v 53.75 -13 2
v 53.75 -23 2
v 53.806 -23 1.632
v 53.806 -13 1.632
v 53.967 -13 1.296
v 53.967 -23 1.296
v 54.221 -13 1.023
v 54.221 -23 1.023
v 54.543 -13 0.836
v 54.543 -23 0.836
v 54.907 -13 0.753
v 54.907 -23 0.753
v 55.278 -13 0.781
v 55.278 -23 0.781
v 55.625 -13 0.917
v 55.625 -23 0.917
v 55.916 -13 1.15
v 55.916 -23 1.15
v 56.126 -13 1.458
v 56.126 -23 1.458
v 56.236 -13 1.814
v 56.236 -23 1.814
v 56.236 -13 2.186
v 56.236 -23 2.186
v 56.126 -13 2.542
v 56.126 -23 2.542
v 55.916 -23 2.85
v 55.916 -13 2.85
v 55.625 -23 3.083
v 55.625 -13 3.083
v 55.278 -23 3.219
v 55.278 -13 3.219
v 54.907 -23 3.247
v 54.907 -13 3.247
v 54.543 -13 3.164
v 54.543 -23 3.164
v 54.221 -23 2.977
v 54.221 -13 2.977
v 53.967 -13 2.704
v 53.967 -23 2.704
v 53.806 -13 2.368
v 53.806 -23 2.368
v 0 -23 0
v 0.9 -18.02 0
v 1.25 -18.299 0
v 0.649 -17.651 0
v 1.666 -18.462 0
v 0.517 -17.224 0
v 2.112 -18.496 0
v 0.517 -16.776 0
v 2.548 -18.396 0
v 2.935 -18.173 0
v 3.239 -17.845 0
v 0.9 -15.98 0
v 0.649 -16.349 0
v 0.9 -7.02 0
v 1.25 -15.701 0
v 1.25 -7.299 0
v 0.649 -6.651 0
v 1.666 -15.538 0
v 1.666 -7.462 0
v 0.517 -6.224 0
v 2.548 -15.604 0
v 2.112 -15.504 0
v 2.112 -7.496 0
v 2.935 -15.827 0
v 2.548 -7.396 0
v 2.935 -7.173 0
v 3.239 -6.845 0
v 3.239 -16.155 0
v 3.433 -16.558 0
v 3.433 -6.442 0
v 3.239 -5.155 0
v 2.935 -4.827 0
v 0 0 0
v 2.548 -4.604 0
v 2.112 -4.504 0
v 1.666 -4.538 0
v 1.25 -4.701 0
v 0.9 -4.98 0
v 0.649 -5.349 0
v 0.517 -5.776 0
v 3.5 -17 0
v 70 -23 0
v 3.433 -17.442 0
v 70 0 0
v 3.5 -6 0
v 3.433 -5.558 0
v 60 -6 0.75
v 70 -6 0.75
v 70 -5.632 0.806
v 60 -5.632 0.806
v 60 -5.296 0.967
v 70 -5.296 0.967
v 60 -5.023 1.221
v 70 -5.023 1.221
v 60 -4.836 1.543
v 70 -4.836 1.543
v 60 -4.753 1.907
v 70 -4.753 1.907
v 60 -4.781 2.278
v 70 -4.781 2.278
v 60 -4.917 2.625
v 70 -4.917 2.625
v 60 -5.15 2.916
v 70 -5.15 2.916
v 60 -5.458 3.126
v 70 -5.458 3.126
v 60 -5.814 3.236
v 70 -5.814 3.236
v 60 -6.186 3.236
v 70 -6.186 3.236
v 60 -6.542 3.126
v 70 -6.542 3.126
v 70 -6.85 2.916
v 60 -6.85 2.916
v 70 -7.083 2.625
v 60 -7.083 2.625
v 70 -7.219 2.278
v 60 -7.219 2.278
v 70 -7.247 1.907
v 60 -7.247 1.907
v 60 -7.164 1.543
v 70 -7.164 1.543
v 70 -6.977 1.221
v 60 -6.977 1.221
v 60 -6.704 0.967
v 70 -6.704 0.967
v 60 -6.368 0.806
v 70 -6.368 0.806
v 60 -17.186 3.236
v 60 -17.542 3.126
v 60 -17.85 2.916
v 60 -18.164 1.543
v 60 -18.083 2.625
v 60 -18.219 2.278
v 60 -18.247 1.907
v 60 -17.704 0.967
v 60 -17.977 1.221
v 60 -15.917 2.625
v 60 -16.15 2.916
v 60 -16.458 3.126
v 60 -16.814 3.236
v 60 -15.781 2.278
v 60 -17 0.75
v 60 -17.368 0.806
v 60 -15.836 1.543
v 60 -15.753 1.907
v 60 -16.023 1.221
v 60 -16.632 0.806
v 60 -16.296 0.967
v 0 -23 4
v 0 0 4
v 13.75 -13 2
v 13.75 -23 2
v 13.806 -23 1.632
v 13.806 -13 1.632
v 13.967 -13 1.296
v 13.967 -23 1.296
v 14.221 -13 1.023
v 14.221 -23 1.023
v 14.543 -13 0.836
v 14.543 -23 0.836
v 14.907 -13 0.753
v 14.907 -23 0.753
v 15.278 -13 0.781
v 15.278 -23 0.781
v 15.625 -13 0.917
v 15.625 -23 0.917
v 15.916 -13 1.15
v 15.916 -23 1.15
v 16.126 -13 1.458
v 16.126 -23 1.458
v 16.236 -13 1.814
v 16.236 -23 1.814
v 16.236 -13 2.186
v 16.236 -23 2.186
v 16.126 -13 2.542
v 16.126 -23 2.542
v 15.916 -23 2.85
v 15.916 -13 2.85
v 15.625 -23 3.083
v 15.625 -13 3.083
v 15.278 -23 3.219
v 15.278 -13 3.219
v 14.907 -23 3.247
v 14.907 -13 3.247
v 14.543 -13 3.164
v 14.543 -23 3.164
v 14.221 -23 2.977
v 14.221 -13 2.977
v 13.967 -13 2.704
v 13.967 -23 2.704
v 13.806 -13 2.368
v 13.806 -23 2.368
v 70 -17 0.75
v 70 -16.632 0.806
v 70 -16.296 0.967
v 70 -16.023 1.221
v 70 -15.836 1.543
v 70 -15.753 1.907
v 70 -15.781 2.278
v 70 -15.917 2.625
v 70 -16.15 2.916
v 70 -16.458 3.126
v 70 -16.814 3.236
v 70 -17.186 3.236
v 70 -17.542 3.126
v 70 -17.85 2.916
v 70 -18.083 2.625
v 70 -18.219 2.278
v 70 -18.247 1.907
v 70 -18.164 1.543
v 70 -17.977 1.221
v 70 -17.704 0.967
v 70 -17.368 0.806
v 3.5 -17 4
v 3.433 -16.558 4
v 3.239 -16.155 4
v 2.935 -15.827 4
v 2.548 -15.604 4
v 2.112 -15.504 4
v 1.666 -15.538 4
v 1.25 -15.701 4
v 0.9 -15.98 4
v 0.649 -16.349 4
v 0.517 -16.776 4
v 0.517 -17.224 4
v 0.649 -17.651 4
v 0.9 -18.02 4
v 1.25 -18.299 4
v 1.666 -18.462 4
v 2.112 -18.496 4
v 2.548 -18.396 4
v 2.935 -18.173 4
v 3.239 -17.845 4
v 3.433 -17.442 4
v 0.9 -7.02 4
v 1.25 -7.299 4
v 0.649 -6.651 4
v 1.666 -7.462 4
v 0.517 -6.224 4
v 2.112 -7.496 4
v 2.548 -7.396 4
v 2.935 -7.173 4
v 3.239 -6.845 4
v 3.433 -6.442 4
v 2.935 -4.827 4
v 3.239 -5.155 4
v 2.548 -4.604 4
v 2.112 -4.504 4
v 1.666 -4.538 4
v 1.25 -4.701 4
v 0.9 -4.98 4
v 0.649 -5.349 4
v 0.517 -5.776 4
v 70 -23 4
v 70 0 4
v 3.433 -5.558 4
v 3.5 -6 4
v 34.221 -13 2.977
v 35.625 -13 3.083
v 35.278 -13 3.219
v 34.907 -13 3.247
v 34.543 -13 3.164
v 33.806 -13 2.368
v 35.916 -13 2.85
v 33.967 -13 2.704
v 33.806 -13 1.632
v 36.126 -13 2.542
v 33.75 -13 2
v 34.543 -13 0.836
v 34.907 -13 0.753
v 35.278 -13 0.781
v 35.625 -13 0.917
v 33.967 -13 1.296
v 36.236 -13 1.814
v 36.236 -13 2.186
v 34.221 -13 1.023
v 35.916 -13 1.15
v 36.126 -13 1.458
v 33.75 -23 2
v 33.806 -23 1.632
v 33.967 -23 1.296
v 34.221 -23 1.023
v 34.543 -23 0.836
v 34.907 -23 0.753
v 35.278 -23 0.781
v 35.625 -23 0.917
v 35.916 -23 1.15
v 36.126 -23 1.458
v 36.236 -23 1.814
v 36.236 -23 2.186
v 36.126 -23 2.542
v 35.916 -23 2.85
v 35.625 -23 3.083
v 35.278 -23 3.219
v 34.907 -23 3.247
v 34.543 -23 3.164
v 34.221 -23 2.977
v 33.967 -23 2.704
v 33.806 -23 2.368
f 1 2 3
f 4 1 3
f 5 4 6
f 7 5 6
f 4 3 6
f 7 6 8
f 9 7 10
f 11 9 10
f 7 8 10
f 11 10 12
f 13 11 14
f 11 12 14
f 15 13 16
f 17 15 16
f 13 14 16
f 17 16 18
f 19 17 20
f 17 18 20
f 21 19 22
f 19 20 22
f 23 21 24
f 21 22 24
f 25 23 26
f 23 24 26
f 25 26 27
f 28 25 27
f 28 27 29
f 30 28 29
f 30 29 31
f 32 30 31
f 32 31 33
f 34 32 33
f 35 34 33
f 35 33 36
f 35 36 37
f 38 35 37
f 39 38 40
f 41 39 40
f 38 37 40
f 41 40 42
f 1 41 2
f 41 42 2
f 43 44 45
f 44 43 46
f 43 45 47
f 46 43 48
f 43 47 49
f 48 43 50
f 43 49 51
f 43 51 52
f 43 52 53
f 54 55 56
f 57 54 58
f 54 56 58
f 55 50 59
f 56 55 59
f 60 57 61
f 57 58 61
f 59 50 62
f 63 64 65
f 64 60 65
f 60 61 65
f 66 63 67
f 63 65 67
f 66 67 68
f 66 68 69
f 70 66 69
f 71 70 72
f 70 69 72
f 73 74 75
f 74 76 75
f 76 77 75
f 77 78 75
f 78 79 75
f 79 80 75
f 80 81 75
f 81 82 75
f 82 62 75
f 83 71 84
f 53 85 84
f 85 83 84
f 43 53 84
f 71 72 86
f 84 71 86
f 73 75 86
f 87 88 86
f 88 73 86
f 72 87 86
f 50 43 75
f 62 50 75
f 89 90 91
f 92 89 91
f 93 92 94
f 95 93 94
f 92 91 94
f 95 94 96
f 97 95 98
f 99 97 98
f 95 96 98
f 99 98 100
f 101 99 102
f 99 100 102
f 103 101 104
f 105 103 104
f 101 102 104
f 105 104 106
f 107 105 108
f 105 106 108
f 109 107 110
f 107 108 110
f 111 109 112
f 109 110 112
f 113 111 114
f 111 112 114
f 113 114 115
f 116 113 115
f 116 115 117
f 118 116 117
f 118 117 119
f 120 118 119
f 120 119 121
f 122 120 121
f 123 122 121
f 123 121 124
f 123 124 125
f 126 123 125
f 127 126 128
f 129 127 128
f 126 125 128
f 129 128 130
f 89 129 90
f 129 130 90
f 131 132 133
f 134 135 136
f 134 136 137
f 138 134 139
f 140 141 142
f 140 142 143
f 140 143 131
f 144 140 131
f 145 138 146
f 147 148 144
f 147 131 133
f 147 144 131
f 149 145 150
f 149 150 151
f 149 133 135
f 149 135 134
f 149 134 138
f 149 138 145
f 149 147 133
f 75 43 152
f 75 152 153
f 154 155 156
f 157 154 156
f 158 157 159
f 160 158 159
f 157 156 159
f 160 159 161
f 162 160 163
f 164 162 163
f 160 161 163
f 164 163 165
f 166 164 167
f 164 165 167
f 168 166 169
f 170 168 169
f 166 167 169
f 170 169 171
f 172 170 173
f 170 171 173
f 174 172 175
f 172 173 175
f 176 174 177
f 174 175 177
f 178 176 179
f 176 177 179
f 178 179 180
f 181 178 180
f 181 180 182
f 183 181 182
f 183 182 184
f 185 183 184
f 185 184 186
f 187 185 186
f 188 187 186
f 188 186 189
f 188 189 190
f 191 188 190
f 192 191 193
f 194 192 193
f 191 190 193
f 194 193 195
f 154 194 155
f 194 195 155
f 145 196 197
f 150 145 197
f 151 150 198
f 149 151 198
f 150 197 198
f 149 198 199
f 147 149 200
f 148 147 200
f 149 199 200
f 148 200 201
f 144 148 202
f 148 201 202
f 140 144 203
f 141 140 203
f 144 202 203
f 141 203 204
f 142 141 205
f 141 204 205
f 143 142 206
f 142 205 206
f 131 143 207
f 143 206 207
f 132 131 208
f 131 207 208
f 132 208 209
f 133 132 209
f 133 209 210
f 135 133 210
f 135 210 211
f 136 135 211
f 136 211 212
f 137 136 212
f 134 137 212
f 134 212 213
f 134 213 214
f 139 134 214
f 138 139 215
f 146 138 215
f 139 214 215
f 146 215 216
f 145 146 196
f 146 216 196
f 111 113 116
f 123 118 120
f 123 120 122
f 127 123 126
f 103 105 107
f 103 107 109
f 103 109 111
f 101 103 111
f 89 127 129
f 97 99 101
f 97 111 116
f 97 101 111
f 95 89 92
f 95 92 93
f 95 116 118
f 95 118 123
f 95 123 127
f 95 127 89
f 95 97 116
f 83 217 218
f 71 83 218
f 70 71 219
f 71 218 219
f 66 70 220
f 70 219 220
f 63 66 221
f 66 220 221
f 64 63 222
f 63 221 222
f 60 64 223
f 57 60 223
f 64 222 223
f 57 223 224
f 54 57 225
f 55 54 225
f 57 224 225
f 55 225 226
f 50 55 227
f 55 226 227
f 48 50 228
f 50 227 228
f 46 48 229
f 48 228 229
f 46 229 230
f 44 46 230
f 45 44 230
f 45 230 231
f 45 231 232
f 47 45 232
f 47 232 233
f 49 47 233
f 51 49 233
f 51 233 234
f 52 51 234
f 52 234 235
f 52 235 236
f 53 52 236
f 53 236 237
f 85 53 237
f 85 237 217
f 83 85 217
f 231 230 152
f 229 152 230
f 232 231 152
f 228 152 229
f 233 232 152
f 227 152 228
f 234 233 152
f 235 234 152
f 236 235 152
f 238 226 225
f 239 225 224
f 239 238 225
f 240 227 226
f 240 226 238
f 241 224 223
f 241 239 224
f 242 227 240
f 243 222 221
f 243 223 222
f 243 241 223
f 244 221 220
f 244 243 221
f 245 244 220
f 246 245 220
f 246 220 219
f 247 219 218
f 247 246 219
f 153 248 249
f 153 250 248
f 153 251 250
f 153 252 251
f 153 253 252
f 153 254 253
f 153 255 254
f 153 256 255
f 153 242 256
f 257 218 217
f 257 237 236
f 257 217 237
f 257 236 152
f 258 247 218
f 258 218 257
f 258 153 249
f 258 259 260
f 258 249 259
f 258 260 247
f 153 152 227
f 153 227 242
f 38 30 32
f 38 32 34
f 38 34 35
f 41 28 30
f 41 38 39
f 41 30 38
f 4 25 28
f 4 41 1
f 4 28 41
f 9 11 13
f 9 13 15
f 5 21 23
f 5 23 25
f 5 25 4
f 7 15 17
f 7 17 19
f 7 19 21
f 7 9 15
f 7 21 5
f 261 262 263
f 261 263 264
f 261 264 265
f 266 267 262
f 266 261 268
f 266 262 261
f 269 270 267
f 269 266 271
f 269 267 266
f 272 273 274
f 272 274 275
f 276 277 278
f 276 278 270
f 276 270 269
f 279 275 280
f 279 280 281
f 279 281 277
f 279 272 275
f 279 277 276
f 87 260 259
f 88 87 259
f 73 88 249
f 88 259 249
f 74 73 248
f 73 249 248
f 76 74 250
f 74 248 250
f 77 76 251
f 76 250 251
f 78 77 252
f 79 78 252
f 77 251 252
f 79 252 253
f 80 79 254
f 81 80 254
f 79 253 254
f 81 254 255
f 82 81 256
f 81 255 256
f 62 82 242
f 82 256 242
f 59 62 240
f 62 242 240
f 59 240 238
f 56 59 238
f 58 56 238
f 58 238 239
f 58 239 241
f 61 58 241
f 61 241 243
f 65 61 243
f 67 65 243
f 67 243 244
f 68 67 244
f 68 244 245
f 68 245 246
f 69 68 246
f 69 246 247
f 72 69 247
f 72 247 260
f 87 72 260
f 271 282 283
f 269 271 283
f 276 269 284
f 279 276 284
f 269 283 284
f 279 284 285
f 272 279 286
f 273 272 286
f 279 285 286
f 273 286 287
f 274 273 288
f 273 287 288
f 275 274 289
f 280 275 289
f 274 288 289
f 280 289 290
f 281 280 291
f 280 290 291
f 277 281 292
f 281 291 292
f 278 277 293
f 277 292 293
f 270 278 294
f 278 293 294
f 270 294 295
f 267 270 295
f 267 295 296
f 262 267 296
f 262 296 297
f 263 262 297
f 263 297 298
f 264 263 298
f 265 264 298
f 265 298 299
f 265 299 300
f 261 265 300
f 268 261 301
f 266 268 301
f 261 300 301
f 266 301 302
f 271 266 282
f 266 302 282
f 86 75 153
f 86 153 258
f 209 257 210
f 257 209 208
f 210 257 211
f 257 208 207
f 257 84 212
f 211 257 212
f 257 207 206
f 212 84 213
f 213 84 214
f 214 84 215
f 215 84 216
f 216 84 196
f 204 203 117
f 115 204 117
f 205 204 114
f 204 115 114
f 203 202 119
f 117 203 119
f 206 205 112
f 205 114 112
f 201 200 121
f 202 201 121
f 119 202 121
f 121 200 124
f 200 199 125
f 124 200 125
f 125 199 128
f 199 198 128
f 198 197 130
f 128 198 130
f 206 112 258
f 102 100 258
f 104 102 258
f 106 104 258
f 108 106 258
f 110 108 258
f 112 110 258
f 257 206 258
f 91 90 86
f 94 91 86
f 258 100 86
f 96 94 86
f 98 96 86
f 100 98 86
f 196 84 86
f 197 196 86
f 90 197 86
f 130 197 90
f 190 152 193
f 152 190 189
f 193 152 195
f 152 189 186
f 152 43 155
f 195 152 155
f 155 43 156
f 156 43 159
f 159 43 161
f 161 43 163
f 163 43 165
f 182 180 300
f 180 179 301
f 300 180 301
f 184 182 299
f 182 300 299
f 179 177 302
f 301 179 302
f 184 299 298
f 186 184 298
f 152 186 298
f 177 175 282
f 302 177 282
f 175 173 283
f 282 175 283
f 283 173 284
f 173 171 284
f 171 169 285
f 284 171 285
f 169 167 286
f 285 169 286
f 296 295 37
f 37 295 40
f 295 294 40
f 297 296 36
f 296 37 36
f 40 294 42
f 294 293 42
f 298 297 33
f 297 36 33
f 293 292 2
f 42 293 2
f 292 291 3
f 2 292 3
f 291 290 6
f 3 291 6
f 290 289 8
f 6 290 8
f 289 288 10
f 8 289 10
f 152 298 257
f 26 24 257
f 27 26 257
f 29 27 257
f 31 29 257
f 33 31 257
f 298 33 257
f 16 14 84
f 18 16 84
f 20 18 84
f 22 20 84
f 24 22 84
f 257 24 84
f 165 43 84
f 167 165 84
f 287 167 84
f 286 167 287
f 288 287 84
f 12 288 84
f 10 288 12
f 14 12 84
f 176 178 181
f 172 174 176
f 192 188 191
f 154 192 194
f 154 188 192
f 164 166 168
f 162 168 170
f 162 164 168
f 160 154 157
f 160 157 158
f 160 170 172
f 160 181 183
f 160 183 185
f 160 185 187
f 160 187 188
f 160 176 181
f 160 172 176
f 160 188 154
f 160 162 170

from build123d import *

# Parameters (mm, degrees)
ESBO_O1_W                = 70
ESBO_O1_H                = 23
RESSALTO_EXTRUS_O1_DEPTH = 4
ESBO_O2_R                = 1.25
CORTE_EXTRUS_O1_DEPTH    = 10
ESBO_O3_R                = 1.25
CORTE_EXTRUS_O2_DEPTH    = 10
ESBO_O4_R                = 1.5
CORTE_EXTRUS_O3_DEPTH    = 10


with BuildPart() as part:
    # Esboço1 → Ressalto-extrusão1 (new body)
    with BuildSketch(Plane.XY):
        with Locations((35, -11.5)):
            Rectangle(ESBO_O1_W, ESBO_O1_H)
    extrude(amount=RESSALTO_EXTRUS_O1_DEPTH)

    # Esboço2 → Corte-extrusão1 (cut)
    with BuildSketch(Plane(origin=(70, 0, 0), x_dir=(0, 0, -1), z_dir=(1, 0, 0))):
        with Locations((-2, -6)):
            Circle(ESBO_O2_R)
        with Locations((-2, -17)):
            Circle(ESBO_O2_R)
    extrude(amount=-CORTE_EXTRUS_O1_DEPTH, mode=Mode.SUBTRACT)

    # Esboço3 → Corte-extrusão2 (cut)
    with BuildSketch(Plane(origin=(0, -23, 0), x_dir=(-1, 0, 0), z_dir=(0, -1, 0))):
        with Locations((-15, -2)):
            Circle(ESBO_O3_R)
        with Locations((-35, -2)):
            Circle(ESBO_O3_R)
        with Locations((-55, -2)):
            Circle(ESBO_O3_R)
    extrude(amount=-CORTE_EXTRUS_O2_DEPTH, mode=Mode.SUBTRACT)

    # Esboço4 → Corte-extrusão3 (cut)
    with BuildSketch(Plane.XY.offset(4)):
        with Locations((2, -6)):
            Circle(ESBO_O4_R)
        with Locations((2, -17)):
            Circle(ESBO_O4_R)
    extrude(amount=-CORTE_EXTRUS_O3_DEPTH, mode=Mode.SUBTRACT)


solid = part.part
